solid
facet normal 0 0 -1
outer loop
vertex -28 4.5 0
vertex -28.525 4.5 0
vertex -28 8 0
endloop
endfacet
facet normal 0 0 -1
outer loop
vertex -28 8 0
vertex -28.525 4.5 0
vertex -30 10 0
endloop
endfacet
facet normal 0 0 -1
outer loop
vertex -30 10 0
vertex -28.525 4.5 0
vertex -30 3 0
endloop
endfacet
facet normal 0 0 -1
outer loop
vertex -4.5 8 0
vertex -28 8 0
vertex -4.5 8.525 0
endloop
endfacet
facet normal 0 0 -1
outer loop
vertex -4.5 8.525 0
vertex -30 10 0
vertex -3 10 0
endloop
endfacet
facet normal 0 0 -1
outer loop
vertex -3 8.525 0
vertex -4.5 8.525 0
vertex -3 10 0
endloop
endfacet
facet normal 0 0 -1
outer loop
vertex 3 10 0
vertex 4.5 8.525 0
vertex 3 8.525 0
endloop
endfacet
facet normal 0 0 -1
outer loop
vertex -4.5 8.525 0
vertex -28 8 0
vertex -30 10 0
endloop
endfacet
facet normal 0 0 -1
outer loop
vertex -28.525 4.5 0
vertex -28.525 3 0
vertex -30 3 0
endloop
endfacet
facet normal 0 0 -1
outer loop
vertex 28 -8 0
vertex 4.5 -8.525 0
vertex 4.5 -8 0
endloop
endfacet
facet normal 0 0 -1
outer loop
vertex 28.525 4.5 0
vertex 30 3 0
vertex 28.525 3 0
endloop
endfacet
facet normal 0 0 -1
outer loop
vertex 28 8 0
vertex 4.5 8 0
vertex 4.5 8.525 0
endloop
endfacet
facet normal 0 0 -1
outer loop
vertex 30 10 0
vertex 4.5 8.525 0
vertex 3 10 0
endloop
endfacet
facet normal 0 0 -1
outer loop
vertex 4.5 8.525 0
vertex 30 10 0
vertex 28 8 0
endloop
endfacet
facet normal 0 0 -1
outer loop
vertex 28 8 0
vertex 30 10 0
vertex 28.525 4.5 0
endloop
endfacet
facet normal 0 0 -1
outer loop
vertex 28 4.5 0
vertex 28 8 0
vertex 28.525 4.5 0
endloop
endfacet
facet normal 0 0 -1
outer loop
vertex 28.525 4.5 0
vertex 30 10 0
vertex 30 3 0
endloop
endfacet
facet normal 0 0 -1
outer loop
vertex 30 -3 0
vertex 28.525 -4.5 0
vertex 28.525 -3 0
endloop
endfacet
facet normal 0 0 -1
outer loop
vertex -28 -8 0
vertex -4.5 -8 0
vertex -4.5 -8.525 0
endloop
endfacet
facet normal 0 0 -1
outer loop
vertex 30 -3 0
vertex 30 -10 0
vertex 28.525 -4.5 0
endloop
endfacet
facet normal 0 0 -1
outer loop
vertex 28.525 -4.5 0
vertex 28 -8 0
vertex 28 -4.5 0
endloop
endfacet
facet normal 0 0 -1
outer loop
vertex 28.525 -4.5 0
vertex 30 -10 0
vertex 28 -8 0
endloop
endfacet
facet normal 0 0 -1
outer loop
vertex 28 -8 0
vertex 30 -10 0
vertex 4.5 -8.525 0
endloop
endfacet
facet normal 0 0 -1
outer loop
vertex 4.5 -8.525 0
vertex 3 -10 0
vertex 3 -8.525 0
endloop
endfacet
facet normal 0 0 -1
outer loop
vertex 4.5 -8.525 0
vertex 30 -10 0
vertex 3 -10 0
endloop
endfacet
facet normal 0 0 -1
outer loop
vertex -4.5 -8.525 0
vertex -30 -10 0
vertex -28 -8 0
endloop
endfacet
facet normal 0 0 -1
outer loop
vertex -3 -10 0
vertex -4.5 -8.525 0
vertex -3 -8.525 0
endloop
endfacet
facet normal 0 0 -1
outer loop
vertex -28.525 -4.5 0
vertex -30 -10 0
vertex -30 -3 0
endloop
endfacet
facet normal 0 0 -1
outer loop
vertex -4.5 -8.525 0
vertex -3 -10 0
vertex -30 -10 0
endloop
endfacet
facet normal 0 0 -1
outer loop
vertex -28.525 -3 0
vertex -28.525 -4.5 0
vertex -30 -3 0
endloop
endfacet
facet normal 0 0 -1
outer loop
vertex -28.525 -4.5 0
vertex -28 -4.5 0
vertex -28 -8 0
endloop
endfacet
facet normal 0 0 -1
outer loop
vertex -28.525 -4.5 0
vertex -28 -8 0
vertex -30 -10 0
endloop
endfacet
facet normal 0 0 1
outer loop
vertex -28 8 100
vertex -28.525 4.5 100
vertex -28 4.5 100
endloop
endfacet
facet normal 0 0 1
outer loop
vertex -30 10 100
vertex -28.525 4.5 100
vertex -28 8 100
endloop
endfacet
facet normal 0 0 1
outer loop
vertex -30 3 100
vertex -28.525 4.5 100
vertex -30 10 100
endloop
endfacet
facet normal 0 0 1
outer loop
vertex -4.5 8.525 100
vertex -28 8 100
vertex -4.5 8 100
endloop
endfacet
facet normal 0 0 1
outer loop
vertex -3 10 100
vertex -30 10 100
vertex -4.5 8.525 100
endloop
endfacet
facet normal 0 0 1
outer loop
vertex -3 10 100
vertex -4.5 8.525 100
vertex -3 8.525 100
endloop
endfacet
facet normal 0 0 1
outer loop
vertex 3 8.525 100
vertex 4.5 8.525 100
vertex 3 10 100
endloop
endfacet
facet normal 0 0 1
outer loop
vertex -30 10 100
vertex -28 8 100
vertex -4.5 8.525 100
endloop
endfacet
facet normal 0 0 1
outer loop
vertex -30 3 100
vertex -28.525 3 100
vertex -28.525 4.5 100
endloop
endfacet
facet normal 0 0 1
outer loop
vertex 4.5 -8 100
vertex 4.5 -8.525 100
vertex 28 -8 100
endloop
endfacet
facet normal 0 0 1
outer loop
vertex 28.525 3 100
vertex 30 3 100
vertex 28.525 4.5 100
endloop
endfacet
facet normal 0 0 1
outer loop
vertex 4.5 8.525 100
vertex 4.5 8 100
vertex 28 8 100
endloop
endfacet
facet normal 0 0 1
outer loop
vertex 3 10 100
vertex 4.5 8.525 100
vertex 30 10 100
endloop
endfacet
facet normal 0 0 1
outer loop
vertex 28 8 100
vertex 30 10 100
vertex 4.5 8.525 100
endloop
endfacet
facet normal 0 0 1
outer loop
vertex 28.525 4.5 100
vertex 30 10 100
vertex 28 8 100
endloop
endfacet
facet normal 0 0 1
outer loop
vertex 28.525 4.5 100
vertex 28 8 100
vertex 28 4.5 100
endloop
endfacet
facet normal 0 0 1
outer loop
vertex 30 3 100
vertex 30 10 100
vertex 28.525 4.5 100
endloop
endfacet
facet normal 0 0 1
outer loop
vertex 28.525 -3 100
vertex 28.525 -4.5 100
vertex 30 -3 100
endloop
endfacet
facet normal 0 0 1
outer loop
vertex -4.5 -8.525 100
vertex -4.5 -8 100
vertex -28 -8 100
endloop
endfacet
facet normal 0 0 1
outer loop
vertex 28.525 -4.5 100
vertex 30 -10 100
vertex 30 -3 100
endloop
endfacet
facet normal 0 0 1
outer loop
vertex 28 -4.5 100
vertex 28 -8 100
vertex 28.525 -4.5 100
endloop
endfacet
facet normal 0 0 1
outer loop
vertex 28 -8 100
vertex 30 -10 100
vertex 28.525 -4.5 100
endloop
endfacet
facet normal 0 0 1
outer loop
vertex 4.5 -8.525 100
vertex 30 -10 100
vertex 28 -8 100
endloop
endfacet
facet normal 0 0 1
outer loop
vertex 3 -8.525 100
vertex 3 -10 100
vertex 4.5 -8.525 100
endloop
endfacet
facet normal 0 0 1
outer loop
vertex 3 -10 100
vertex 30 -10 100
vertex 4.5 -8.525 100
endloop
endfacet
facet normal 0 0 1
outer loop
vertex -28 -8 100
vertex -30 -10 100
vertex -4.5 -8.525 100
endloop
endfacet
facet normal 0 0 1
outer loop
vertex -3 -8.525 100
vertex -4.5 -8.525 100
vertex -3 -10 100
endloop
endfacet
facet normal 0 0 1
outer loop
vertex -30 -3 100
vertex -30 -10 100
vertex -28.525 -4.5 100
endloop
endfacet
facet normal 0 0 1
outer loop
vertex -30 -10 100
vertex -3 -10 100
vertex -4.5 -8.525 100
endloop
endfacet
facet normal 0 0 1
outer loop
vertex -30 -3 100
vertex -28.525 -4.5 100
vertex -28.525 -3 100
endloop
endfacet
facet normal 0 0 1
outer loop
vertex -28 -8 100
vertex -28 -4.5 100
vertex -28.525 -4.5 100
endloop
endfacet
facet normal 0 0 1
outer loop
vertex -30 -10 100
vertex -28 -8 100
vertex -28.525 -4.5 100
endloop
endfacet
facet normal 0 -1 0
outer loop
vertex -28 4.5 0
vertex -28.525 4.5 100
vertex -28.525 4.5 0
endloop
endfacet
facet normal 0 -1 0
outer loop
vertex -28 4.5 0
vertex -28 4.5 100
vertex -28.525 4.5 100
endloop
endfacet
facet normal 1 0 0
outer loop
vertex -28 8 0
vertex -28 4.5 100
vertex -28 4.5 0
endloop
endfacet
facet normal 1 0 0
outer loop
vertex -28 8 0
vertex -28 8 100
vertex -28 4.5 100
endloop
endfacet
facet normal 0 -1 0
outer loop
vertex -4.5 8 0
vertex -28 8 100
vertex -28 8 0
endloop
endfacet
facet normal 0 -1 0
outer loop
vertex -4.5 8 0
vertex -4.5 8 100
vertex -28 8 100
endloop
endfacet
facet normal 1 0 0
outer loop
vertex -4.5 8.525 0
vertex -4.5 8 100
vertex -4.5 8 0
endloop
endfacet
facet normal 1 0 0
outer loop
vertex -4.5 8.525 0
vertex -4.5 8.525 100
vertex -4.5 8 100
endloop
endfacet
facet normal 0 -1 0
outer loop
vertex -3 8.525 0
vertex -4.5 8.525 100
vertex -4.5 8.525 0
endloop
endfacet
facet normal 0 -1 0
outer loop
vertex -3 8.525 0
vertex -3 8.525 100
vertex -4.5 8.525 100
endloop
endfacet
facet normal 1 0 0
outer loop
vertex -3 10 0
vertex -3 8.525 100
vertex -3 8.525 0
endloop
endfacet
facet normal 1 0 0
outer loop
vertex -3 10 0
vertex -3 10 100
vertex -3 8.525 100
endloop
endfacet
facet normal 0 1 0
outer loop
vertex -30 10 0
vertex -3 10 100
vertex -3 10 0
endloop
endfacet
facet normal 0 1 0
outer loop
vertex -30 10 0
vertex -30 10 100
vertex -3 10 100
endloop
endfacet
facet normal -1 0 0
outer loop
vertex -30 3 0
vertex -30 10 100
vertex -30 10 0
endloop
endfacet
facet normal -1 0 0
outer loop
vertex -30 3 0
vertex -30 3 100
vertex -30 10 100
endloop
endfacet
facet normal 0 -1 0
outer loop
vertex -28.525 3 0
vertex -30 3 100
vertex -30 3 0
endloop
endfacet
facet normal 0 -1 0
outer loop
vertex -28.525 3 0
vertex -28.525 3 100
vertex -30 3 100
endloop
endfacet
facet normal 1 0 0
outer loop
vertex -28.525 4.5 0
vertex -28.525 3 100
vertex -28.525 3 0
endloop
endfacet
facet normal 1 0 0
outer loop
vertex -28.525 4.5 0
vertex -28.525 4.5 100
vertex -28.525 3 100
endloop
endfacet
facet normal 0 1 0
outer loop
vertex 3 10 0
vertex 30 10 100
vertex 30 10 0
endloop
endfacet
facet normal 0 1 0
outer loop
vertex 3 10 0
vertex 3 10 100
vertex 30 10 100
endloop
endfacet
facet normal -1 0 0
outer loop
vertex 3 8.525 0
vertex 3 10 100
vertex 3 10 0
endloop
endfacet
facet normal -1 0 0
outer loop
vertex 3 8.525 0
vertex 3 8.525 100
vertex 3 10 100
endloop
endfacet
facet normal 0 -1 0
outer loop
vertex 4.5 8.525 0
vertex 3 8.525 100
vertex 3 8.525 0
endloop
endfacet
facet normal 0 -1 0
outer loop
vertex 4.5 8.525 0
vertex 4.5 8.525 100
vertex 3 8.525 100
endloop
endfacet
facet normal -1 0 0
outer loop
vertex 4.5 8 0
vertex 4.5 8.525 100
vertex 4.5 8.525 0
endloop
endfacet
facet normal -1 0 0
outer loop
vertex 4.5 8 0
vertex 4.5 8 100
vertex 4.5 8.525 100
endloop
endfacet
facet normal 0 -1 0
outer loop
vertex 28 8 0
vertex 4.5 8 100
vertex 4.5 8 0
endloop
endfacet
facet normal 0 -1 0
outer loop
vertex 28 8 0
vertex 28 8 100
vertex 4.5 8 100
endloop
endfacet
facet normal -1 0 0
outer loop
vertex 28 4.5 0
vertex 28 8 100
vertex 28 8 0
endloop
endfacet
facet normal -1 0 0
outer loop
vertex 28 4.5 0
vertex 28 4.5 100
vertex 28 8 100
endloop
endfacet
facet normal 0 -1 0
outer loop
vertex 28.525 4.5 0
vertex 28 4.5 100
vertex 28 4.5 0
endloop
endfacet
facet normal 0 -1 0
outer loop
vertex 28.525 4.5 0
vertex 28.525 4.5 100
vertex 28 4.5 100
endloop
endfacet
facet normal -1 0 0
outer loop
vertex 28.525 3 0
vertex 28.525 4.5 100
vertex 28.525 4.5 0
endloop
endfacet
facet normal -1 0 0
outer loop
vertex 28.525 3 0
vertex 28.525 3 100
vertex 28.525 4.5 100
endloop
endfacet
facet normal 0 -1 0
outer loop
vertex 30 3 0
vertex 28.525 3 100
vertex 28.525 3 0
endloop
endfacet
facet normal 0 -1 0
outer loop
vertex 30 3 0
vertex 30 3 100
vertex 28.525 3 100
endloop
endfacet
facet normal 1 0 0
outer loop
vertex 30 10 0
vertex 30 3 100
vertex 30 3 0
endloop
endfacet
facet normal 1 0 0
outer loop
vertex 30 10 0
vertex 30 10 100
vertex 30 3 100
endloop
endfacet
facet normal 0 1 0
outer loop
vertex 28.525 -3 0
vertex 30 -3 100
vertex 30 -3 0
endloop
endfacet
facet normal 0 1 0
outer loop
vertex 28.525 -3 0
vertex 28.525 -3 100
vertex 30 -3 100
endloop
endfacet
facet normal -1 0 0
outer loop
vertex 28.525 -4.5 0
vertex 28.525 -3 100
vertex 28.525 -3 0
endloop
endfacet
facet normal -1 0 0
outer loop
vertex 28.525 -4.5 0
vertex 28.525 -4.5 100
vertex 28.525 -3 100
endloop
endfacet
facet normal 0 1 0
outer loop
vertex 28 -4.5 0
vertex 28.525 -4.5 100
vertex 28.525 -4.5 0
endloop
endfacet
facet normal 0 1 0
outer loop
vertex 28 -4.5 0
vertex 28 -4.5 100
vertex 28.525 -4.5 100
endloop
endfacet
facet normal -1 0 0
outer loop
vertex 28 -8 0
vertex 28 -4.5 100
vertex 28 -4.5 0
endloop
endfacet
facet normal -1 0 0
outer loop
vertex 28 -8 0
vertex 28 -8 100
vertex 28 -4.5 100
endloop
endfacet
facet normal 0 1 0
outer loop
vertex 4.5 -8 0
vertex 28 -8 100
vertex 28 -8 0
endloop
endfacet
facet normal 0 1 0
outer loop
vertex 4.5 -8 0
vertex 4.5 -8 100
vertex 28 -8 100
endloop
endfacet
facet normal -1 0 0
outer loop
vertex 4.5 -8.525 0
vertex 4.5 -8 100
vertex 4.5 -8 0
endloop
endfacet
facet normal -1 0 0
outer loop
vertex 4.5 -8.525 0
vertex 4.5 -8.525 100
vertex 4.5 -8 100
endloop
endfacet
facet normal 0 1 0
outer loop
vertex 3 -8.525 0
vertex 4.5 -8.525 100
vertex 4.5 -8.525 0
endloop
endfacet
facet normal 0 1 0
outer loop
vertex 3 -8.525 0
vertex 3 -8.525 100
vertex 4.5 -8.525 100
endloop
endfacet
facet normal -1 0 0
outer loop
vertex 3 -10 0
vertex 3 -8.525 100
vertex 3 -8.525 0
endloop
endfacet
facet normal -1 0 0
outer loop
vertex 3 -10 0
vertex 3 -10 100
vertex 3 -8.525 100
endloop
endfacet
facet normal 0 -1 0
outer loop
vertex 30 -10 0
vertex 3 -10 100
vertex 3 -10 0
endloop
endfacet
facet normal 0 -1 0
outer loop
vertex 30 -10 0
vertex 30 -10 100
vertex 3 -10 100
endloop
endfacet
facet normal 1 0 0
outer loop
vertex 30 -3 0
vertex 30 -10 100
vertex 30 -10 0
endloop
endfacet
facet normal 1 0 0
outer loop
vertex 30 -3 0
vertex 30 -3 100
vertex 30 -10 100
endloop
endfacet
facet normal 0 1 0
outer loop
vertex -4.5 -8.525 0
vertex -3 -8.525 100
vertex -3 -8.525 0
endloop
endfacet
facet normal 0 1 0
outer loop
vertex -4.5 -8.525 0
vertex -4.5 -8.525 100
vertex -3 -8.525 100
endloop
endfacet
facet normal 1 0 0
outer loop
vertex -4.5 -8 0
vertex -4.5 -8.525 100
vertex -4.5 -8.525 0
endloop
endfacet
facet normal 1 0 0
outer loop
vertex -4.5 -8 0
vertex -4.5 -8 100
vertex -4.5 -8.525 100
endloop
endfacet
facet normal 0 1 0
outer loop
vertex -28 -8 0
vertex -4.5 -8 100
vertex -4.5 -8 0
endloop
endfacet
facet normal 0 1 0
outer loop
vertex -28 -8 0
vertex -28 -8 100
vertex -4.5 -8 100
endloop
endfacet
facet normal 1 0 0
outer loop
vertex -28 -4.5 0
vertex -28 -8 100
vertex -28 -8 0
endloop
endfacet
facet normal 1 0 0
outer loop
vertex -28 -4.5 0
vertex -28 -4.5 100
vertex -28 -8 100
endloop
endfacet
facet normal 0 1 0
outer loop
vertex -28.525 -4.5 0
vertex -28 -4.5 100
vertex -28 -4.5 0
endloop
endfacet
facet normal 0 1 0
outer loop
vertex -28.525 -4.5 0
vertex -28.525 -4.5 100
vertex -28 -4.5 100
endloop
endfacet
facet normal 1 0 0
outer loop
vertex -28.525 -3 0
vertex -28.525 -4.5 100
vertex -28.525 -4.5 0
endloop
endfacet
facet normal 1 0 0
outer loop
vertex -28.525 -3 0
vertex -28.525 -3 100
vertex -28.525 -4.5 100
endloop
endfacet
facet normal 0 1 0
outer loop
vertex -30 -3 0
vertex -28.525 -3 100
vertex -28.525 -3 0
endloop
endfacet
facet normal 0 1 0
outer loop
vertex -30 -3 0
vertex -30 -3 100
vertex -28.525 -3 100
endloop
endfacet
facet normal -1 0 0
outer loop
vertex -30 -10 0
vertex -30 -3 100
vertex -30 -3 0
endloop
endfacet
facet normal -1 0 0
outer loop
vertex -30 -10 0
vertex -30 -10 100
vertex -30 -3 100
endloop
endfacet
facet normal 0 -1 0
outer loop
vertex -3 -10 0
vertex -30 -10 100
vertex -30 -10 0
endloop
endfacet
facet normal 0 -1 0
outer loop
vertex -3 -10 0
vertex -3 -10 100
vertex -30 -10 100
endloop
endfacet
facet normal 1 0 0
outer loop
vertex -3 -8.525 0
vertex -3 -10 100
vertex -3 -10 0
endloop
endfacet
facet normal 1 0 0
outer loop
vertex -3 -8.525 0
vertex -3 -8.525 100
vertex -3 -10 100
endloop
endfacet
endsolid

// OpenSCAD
$fn = 64;

// 20x60 aluminium extrusion profile (T-slot style), 100mm long
length = 100;
w = 60;
h = 20;

// Typical-ish proportions for 20-series extrusion (kept parametric)
wall      = 2.0;   // outer wall thickness
web       = 2.0;   // internal cross web thickness (keeps ONE connected solid)
slot_w    = 6.0;   // slot opening width
slot_depth= 5.0;   // slot depth from outer face inward
lip       = 1.5;   // small "T-slot lip" thickness near the opening
eps       = 0.05;  // tiny overlap to avoid coincident faces

module extrusion_20x60_profile_2d() {
    difference() {
        // Outer boundary
        square([w, h], center=true);

        // Hollow interior (leave outer wall)
        square([w - 2*wall, h - 2*wall], center=true);

        // Re-add internal webs so the profile is ONE connected solid
        union() {
            square([web, h - 2*wall + 2*eps], center=true); // vertical web
            square([w - 2*wall + 2*eps, web], center=true); // horizontal web
        }

        // T-slot openings (cut from outside inward), with a slight undercut behind the lips
        // Right slot
        translate([ w/2 - slot_depth/2, 0 ])
            square([slot_depth + eps, slot_w], center=true);
        translate([ w/2 - (slot_depth - lip)/2 - lip, 0 ])
            square([slot_depth - lip + eps, slot_w + 2*lip], center=true);

        // Left slot
        translate([ -w/2 + slot_depth/2, 0 ])
            square([slot_depth + eps, slot_w], center=true);
        translate([ -w/2 + (slot_depth - lip)/2 + lip, 0 ])
            square([slot_depth - lip + eps, slot_w + 2*lip], center=true);

        // Top slot
        translate([ 0,  h/2 - slot_depth/2 ])
            square([slot_w, slot_depth + eps], center=true);
        translate([ 0,  h/2 - (slot_depth - lip)/2 - lip ])
            square([slot_w + 2*lip, slot_depth - lip + eps], center=true);

        // Bottom slot
        translate([ 0, -h/2 + slot_depth/2 ])
            square([slot_w, slot_depth + eps], center=true);
        translate([ 0, -h/2 + (slot_depth - lip)/2 + lip ])
            square([slot_w + 2*lip, slot_depth - lip + eps], center=true);
    }
}

color([0.75, 0.75, 0.78])
linear_extrude(height=length, center=false, convexity=10)
    extrusion_20x60_profile_2d();
